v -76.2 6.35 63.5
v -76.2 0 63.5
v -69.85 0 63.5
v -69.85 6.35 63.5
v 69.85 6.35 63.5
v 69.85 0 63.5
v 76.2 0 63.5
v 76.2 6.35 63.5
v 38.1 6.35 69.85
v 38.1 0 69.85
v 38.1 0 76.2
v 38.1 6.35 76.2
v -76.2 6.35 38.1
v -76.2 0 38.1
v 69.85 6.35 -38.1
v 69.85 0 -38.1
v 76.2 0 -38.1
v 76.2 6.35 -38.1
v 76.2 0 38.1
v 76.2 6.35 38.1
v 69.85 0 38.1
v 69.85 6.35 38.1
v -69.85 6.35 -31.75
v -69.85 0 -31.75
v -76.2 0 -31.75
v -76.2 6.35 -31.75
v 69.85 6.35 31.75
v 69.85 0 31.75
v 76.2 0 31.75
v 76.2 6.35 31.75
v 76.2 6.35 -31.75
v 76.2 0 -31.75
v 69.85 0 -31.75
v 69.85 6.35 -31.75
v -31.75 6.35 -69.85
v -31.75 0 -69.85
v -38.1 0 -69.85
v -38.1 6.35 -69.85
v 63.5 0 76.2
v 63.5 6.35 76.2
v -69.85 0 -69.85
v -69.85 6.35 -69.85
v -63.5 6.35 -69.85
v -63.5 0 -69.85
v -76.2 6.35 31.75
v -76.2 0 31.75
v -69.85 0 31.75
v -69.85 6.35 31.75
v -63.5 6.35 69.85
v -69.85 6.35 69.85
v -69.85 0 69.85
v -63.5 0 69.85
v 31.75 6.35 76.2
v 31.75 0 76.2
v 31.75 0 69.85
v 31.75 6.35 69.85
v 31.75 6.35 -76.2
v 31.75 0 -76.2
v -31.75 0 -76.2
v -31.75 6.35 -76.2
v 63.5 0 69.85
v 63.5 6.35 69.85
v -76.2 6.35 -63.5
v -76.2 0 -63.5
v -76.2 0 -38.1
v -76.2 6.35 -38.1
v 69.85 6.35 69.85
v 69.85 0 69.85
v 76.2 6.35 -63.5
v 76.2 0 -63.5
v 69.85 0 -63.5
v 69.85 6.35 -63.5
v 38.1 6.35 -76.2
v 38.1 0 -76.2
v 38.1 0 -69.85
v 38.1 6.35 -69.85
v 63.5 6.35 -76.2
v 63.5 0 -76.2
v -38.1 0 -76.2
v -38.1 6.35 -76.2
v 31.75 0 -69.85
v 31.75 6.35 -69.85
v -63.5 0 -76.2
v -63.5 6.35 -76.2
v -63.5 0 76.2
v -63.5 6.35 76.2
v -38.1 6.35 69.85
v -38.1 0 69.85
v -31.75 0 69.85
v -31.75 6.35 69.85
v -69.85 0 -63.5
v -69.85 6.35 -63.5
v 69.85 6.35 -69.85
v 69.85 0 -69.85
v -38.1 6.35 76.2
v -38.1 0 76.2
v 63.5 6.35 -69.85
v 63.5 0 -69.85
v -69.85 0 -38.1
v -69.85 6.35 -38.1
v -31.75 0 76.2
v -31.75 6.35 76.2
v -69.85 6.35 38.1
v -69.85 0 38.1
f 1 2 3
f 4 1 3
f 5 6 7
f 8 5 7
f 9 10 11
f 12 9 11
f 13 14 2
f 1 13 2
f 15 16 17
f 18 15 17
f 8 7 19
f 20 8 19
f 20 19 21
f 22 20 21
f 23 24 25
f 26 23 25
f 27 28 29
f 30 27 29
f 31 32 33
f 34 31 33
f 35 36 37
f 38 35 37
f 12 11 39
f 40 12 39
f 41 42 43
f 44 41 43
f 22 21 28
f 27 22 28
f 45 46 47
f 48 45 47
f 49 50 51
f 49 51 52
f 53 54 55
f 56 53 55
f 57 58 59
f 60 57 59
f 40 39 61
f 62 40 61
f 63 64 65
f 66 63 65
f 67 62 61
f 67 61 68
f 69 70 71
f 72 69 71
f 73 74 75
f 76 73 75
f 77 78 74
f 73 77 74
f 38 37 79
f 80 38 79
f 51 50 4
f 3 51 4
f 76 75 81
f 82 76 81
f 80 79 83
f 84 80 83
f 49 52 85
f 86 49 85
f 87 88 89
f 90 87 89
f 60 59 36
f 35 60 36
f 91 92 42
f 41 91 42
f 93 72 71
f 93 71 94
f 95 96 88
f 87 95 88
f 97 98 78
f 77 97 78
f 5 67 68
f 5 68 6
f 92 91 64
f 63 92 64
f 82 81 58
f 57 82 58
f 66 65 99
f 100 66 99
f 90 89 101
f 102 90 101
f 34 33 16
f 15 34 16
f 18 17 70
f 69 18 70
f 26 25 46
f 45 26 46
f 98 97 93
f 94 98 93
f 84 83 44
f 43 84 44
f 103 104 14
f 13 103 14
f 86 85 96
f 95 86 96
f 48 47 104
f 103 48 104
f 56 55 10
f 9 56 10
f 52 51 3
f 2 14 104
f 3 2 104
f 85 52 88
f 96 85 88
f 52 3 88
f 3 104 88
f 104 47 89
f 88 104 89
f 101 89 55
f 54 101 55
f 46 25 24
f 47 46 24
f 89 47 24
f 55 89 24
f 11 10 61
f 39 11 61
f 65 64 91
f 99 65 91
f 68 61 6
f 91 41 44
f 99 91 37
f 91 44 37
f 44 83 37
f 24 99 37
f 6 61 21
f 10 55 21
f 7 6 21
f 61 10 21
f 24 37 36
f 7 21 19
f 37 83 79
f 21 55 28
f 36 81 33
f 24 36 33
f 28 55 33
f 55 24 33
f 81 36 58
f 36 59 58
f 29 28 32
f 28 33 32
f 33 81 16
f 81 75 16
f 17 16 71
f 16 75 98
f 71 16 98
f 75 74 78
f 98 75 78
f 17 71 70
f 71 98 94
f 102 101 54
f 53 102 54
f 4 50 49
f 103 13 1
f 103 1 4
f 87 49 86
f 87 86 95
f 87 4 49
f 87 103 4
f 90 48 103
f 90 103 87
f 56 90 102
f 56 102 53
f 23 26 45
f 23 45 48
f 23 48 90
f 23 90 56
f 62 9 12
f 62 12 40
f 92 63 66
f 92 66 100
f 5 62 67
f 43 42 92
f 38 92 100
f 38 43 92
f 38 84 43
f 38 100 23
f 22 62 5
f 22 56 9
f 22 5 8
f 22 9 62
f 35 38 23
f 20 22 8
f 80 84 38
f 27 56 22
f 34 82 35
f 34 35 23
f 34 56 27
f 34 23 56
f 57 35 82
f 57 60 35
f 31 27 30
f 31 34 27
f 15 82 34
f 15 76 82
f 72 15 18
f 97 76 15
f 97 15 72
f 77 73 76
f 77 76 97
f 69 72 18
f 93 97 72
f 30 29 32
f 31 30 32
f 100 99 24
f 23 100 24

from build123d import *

# Parameters (mm, degrees)
BOSS_EXTRUDE1_DEPTH = 6.35


with BuildPart() as part:
    # Sketch1 → Boss-Extrude1 (new body)
    with BuildSketch(Plane(origin=(0, 0, 0), x_dir=(1, 0, 0), z_dir=(0, 1, 0))):
        Polygon((-76.2, -38.1), (-76.2, -63.5), (-69.85, -63.5), (-69.85, -69.85), (-63.5, -69.85), (-63.5, -76.2), (-38.1, -76.2), (-38.1, -69.85), (-31.75, -69.85), (-31.75, -76.2), (31.75, -76.2), (31.75, -69.85), (38.1, -69.85), (38.1, -76.2), (63.5, -76.2), (63.5, -69.85), (69.85, -69.85), (69.85, -63.5), (76.2, -63.5), (76.2, -38.1), (69.85, -38.1), (69.85, -31.75), (76.2, -31.75), (76.2, 31.75), (69.85, 31.75), (69.85, 38.1), (76.2, 38.1), (76.2, 63.5), (69.85, 63.5), (69.85, 69.85), (63.5, 69.85), (63.5, 76.2), (38.1, 76.2), (38.1, 69.85), (31.75, 69.85), (31.75, 76.2), (-31.75, 76.2), (-31.75, 69.85), (-38.1, 69.85), (-38.1, 76.2), (-63.5, 76.2), (-63.5, 69.85), (-69.85, 69.85), (-69.85, 63.5), (-76.2, 63.5), (-76.2, 38.1), (-69.85, 38.1), (-69.85, 31.75), (-76.2, 31.75), (-76.2, -31.75), (-69.85, -31.75), (-69.85, -38.1), align=None)
    extrude(amount=BOSS_EXTRUDE1_DEPTH)


solid = part.part
